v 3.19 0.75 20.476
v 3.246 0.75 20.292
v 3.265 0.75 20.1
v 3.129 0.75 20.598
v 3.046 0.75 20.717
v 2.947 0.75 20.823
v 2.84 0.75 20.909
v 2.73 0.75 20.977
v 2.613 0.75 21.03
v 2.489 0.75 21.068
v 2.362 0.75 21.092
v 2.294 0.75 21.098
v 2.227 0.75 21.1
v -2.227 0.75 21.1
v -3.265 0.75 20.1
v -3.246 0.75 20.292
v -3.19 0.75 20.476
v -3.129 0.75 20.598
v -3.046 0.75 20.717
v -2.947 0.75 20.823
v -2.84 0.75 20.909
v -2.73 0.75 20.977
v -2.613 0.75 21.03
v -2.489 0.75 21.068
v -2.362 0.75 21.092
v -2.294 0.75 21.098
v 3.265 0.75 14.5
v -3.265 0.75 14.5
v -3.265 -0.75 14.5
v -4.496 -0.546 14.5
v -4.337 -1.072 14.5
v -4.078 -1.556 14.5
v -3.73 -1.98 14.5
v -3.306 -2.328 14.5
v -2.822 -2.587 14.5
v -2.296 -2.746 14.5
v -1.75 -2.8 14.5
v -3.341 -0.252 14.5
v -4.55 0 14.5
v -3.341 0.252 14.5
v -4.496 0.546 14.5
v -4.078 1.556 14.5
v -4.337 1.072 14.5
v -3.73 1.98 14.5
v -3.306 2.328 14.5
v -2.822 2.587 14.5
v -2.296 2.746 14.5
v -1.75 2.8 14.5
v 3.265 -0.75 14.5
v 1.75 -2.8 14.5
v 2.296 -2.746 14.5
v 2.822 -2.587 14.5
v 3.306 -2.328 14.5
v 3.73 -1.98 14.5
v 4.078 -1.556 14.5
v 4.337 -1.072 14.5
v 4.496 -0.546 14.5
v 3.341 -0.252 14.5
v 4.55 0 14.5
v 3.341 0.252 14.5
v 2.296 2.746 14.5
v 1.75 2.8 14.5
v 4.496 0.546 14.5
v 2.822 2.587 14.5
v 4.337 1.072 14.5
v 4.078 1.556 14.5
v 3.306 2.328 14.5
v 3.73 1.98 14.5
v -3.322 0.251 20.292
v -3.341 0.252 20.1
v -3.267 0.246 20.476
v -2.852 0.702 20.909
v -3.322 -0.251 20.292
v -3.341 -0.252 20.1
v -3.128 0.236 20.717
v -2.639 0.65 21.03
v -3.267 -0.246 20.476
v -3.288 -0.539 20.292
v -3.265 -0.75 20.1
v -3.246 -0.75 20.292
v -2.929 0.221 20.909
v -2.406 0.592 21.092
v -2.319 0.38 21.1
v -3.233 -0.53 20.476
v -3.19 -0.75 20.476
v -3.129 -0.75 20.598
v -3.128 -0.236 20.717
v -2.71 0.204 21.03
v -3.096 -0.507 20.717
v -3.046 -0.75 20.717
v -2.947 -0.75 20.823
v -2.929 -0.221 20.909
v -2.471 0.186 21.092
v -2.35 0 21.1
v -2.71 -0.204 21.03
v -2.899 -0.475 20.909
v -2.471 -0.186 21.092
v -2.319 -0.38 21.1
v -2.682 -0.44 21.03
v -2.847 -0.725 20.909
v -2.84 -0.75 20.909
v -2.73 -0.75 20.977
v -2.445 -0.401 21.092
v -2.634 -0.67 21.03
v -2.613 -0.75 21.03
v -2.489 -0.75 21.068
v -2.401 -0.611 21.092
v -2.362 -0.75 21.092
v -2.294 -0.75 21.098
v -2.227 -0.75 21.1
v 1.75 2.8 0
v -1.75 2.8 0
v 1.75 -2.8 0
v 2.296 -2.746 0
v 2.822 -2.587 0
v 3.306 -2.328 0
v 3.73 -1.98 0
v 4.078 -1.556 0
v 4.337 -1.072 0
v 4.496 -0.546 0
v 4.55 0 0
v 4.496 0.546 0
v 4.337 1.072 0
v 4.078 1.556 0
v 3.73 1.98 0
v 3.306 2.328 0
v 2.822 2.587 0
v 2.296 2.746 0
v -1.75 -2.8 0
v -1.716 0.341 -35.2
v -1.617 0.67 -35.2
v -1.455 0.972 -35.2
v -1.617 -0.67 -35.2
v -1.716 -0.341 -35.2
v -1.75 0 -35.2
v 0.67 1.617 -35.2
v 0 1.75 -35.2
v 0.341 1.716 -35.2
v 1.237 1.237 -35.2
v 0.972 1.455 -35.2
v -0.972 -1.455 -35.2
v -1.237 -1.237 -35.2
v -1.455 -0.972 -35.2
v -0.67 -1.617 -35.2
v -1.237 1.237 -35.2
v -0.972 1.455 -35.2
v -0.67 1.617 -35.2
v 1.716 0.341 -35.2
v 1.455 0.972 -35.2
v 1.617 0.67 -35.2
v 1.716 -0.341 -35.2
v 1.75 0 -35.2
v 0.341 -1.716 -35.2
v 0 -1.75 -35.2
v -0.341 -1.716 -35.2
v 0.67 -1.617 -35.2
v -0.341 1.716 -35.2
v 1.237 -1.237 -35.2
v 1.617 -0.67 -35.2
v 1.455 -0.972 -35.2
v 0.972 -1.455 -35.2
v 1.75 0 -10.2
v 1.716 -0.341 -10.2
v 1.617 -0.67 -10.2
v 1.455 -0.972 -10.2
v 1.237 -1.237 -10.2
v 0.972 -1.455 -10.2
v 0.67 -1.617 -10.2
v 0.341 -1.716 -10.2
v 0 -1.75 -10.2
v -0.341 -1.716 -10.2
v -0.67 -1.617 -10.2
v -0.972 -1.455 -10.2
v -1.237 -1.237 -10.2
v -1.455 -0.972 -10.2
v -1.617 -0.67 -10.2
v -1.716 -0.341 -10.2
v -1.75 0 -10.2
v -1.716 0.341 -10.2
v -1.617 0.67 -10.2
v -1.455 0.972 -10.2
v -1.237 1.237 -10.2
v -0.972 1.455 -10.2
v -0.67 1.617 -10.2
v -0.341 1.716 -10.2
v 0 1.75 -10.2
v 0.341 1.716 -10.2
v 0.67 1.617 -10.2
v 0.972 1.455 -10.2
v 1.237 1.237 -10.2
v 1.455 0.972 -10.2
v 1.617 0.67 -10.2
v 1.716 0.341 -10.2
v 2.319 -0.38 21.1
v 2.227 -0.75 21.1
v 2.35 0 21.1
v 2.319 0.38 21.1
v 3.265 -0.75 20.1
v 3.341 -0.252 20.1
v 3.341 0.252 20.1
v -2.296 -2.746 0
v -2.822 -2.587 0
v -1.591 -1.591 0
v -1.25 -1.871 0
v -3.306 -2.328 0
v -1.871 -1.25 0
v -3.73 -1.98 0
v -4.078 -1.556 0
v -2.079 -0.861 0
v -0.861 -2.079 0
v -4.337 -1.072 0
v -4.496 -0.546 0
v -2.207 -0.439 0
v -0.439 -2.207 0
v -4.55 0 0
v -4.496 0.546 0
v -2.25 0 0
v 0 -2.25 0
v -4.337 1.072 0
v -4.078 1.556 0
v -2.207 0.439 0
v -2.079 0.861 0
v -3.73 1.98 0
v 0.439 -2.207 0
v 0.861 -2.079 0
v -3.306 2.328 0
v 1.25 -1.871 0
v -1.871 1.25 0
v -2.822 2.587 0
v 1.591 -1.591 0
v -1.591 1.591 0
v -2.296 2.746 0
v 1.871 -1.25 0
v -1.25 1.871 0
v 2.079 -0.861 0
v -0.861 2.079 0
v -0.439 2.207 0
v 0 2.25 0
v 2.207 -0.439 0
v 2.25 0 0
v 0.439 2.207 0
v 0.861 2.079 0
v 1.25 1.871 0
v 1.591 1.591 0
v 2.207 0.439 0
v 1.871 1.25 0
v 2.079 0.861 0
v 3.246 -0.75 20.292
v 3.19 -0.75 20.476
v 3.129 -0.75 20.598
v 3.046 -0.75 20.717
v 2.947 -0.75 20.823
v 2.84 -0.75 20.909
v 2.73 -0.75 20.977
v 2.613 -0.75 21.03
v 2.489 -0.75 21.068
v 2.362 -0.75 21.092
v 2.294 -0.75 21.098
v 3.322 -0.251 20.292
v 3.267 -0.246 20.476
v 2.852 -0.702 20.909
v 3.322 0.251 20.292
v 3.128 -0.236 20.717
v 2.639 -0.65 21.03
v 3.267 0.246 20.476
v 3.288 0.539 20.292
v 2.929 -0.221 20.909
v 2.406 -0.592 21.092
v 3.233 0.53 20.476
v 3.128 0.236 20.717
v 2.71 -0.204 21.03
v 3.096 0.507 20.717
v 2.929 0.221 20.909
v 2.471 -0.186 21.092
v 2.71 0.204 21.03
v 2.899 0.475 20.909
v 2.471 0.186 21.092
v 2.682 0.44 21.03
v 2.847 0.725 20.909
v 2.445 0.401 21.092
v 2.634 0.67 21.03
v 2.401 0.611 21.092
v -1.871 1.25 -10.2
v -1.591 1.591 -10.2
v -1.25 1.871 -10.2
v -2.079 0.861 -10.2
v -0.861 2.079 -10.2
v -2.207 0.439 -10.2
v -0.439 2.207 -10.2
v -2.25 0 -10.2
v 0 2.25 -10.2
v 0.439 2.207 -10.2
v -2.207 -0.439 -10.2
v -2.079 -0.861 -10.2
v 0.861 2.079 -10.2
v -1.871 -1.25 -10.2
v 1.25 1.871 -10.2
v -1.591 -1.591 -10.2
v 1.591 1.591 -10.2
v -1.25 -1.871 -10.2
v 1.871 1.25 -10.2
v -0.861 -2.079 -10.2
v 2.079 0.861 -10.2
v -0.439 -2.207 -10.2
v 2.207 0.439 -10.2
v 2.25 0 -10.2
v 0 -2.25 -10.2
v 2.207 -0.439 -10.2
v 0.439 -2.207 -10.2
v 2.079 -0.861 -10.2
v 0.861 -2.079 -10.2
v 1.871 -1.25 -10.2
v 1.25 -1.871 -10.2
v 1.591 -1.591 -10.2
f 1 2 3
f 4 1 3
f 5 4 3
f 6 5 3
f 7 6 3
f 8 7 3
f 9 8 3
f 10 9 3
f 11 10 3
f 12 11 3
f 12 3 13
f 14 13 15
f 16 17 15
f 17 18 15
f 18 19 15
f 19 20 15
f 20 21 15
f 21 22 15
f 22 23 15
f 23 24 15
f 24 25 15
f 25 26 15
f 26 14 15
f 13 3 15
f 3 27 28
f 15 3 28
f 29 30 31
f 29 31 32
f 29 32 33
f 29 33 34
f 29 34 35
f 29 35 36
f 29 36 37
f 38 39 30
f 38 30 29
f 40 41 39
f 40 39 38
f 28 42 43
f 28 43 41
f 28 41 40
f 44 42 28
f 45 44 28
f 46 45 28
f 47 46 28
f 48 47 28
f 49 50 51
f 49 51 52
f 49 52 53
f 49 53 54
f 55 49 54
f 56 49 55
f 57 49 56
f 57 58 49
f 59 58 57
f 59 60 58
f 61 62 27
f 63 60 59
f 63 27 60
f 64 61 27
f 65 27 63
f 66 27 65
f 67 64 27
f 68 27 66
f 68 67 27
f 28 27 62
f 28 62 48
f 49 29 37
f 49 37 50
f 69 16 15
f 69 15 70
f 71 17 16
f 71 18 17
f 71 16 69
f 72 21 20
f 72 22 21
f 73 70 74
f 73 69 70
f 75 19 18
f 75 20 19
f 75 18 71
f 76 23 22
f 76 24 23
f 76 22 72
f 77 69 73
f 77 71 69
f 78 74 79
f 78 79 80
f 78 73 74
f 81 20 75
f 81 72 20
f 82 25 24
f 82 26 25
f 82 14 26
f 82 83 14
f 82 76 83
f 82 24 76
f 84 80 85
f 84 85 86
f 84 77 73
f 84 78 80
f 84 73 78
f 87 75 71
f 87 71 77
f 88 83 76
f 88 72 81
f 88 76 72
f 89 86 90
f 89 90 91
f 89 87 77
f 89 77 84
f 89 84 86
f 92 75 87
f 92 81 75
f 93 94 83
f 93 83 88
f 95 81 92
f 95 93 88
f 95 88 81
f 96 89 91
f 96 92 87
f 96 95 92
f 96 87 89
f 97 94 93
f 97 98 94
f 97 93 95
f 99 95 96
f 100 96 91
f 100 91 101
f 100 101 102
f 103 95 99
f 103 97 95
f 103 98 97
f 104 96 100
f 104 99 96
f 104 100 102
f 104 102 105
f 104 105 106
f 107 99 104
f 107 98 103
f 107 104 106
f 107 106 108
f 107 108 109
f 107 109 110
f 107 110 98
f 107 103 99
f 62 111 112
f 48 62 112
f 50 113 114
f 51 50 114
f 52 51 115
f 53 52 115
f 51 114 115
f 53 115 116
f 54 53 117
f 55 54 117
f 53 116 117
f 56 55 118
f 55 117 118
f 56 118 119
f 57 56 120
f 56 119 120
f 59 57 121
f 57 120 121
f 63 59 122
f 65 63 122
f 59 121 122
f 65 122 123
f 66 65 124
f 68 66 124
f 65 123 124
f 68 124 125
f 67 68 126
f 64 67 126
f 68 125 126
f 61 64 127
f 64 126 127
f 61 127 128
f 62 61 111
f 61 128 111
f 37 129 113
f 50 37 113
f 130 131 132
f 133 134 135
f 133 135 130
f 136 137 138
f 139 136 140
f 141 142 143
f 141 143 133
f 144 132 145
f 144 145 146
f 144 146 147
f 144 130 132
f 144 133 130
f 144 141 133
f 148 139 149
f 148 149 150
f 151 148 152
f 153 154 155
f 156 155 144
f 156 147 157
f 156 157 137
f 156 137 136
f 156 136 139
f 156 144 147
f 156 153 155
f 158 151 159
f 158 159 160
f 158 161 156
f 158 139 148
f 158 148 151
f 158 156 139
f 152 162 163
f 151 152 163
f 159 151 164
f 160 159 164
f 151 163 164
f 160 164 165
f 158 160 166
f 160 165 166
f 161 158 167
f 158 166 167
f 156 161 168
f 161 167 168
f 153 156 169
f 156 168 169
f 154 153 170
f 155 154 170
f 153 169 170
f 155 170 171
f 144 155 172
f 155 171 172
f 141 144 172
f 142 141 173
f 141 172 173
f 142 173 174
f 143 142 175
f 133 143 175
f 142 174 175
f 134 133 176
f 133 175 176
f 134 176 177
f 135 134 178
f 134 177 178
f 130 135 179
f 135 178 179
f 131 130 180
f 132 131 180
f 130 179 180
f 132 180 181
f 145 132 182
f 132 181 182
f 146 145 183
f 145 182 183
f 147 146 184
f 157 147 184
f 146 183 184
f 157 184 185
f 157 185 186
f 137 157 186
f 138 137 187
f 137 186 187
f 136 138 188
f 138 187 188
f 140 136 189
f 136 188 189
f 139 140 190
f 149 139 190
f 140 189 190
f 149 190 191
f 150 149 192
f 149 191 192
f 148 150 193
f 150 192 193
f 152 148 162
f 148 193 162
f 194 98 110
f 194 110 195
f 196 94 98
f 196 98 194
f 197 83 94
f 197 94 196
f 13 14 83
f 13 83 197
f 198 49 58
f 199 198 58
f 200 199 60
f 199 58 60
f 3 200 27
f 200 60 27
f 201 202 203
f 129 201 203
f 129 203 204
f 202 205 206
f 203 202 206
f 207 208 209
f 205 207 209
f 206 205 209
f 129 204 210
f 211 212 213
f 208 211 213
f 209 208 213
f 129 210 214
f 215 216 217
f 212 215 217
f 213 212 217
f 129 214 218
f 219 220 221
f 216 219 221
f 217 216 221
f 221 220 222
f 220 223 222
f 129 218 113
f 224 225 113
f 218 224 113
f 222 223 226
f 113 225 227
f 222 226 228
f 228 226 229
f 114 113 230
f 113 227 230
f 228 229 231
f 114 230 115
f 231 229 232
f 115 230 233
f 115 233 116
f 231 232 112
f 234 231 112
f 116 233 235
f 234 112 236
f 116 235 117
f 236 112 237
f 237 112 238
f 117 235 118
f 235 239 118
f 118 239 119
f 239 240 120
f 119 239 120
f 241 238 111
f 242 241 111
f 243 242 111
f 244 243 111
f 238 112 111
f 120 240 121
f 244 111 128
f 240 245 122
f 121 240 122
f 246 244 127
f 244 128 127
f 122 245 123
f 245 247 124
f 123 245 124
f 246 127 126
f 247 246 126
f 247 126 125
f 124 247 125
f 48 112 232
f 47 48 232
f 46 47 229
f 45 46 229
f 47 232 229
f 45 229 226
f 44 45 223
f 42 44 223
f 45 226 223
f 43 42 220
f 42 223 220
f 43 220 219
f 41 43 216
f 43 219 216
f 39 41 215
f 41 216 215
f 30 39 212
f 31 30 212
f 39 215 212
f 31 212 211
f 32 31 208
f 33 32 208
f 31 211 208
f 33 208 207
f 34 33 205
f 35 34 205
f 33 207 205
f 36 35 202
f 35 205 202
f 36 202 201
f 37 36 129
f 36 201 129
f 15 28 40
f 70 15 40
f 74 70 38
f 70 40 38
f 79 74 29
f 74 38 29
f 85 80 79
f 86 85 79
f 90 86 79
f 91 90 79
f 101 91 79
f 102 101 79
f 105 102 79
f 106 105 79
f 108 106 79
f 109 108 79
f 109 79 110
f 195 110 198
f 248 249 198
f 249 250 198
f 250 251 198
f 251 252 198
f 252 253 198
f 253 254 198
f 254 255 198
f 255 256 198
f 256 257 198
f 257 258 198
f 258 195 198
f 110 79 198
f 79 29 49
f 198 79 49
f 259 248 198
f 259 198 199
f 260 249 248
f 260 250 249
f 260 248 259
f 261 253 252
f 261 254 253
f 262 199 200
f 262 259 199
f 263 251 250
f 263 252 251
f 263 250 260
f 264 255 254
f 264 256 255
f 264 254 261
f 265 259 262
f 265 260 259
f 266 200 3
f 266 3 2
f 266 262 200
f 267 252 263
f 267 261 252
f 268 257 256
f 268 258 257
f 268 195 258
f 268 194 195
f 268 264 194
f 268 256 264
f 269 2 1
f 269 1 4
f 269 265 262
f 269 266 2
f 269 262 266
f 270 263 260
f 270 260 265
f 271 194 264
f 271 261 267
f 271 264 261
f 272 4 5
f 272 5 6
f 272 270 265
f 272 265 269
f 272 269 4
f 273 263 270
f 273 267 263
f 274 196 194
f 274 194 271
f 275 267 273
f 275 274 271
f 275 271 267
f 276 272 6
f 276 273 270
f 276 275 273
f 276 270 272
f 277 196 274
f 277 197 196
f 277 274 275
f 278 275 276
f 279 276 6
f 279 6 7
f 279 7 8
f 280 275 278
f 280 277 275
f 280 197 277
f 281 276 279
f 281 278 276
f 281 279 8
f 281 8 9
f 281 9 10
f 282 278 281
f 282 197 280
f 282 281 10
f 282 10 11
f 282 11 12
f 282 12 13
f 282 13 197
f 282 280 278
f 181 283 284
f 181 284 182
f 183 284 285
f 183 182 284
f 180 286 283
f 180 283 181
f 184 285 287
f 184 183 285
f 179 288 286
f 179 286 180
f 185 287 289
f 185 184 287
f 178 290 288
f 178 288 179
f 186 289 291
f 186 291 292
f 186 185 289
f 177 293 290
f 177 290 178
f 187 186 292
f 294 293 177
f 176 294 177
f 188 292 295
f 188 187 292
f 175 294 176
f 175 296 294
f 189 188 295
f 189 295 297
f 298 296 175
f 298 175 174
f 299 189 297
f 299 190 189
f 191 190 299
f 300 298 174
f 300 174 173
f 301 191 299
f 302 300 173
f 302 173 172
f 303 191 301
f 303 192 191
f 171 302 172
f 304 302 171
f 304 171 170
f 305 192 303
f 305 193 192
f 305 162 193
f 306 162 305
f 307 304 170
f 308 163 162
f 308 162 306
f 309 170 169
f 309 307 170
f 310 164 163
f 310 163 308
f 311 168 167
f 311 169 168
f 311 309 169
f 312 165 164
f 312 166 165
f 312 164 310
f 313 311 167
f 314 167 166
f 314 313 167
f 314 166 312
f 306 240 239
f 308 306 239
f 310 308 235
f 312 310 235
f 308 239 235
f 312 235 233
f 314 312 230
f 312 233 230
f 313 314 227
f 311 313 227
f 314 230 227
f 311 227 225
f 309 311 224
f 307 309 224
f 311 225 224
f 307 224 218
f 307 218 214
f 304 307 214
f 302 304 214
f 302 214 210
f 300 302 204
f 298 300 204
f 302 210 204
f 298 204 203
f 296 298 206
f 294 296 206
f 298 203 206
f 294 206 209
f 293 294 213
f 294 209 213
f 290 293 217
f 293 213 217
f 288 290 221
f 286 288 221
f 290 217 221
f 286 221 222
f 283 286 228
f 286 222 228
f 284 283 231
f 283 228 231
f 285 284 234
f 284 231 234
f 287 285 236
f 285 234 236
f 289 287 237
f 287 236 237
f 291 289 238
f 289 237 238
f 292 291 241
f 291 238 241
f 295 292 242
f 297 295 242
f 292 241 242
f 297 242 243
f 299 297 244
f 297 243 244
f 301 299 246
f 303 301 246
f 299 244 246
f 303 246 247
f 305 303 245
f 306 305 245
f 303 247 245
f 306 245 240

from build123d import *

# Parameters (mm, degrees)
F1_DEPTH = 14.5
F3_DEPTH = 6.6
F4_R     = 1
F5_R     = 2.25
F6_DEPTH = 10.2
F7_R     = 1.75
F8_DEPTH = 25


with BuildPart() as f1:
    # F0 (on Top) → F1 (new body)
    with BuildSketch(Plane.XY):
        with BuildLine():
            ThreePointArc((1.75, -2.8), (4.55, 0), (1.75, 2.8))
            Line((1.75, 2.8), (-1.75, 2.8))
            ThreePointArc((-1.75, 2.8), (-4.55, 0), (-1.75, -2.8))
            Line((-1.75, -2.8), (1.75, -2.8))
        make_face()
    extrude(amount=F1_DEPTH)

    # F2 (on face) → F3 (join)
    with BuildSketch(Plane.XY.offset(14.5)):
        with BuildLine():
            Line((3.264966, 0.75), (-3.264966, 0.75))
            ThreePointArc((-3.264966, 0.75), (-3.35, 0), (-3.264966, -0.75))
            Line((-3.264966, -0.75), (3.264966, -0.75))
            ThreePointArc((3.264966, -0.75), (3.35, 0), (3.264966, 0.75))
        make_face()
    extrude(amount=F3_DEPTH)

    # F4
    f4_edges = [f1.edges().sort_by_distance(p)[0] for p in [
        (-3.35, 0, 21.1),
        (3.35, 0, 21.1),
    ]]
    fillet(f4_edges, radius=F4_R)

    # F5 (on face) → F6 (join)
    with BuildSketch(Plane(origin=(0, 0, 0), x_dir=(1, 0, 0), z_dir=(0, 0, -1))):
        Circle(F5_R)
    extrude(amount=F6_DEPTH)

    # F7 (on face) → F8 (join)
    with BuildSketch(Plane(origin=(0, 0, -10.2), x_dir=(1, 0, 0), z_dir=(0, 0, -1))):
        Circle(F7_R)
    extrude(amount=F8_DEPTH)


solid = f1.part
